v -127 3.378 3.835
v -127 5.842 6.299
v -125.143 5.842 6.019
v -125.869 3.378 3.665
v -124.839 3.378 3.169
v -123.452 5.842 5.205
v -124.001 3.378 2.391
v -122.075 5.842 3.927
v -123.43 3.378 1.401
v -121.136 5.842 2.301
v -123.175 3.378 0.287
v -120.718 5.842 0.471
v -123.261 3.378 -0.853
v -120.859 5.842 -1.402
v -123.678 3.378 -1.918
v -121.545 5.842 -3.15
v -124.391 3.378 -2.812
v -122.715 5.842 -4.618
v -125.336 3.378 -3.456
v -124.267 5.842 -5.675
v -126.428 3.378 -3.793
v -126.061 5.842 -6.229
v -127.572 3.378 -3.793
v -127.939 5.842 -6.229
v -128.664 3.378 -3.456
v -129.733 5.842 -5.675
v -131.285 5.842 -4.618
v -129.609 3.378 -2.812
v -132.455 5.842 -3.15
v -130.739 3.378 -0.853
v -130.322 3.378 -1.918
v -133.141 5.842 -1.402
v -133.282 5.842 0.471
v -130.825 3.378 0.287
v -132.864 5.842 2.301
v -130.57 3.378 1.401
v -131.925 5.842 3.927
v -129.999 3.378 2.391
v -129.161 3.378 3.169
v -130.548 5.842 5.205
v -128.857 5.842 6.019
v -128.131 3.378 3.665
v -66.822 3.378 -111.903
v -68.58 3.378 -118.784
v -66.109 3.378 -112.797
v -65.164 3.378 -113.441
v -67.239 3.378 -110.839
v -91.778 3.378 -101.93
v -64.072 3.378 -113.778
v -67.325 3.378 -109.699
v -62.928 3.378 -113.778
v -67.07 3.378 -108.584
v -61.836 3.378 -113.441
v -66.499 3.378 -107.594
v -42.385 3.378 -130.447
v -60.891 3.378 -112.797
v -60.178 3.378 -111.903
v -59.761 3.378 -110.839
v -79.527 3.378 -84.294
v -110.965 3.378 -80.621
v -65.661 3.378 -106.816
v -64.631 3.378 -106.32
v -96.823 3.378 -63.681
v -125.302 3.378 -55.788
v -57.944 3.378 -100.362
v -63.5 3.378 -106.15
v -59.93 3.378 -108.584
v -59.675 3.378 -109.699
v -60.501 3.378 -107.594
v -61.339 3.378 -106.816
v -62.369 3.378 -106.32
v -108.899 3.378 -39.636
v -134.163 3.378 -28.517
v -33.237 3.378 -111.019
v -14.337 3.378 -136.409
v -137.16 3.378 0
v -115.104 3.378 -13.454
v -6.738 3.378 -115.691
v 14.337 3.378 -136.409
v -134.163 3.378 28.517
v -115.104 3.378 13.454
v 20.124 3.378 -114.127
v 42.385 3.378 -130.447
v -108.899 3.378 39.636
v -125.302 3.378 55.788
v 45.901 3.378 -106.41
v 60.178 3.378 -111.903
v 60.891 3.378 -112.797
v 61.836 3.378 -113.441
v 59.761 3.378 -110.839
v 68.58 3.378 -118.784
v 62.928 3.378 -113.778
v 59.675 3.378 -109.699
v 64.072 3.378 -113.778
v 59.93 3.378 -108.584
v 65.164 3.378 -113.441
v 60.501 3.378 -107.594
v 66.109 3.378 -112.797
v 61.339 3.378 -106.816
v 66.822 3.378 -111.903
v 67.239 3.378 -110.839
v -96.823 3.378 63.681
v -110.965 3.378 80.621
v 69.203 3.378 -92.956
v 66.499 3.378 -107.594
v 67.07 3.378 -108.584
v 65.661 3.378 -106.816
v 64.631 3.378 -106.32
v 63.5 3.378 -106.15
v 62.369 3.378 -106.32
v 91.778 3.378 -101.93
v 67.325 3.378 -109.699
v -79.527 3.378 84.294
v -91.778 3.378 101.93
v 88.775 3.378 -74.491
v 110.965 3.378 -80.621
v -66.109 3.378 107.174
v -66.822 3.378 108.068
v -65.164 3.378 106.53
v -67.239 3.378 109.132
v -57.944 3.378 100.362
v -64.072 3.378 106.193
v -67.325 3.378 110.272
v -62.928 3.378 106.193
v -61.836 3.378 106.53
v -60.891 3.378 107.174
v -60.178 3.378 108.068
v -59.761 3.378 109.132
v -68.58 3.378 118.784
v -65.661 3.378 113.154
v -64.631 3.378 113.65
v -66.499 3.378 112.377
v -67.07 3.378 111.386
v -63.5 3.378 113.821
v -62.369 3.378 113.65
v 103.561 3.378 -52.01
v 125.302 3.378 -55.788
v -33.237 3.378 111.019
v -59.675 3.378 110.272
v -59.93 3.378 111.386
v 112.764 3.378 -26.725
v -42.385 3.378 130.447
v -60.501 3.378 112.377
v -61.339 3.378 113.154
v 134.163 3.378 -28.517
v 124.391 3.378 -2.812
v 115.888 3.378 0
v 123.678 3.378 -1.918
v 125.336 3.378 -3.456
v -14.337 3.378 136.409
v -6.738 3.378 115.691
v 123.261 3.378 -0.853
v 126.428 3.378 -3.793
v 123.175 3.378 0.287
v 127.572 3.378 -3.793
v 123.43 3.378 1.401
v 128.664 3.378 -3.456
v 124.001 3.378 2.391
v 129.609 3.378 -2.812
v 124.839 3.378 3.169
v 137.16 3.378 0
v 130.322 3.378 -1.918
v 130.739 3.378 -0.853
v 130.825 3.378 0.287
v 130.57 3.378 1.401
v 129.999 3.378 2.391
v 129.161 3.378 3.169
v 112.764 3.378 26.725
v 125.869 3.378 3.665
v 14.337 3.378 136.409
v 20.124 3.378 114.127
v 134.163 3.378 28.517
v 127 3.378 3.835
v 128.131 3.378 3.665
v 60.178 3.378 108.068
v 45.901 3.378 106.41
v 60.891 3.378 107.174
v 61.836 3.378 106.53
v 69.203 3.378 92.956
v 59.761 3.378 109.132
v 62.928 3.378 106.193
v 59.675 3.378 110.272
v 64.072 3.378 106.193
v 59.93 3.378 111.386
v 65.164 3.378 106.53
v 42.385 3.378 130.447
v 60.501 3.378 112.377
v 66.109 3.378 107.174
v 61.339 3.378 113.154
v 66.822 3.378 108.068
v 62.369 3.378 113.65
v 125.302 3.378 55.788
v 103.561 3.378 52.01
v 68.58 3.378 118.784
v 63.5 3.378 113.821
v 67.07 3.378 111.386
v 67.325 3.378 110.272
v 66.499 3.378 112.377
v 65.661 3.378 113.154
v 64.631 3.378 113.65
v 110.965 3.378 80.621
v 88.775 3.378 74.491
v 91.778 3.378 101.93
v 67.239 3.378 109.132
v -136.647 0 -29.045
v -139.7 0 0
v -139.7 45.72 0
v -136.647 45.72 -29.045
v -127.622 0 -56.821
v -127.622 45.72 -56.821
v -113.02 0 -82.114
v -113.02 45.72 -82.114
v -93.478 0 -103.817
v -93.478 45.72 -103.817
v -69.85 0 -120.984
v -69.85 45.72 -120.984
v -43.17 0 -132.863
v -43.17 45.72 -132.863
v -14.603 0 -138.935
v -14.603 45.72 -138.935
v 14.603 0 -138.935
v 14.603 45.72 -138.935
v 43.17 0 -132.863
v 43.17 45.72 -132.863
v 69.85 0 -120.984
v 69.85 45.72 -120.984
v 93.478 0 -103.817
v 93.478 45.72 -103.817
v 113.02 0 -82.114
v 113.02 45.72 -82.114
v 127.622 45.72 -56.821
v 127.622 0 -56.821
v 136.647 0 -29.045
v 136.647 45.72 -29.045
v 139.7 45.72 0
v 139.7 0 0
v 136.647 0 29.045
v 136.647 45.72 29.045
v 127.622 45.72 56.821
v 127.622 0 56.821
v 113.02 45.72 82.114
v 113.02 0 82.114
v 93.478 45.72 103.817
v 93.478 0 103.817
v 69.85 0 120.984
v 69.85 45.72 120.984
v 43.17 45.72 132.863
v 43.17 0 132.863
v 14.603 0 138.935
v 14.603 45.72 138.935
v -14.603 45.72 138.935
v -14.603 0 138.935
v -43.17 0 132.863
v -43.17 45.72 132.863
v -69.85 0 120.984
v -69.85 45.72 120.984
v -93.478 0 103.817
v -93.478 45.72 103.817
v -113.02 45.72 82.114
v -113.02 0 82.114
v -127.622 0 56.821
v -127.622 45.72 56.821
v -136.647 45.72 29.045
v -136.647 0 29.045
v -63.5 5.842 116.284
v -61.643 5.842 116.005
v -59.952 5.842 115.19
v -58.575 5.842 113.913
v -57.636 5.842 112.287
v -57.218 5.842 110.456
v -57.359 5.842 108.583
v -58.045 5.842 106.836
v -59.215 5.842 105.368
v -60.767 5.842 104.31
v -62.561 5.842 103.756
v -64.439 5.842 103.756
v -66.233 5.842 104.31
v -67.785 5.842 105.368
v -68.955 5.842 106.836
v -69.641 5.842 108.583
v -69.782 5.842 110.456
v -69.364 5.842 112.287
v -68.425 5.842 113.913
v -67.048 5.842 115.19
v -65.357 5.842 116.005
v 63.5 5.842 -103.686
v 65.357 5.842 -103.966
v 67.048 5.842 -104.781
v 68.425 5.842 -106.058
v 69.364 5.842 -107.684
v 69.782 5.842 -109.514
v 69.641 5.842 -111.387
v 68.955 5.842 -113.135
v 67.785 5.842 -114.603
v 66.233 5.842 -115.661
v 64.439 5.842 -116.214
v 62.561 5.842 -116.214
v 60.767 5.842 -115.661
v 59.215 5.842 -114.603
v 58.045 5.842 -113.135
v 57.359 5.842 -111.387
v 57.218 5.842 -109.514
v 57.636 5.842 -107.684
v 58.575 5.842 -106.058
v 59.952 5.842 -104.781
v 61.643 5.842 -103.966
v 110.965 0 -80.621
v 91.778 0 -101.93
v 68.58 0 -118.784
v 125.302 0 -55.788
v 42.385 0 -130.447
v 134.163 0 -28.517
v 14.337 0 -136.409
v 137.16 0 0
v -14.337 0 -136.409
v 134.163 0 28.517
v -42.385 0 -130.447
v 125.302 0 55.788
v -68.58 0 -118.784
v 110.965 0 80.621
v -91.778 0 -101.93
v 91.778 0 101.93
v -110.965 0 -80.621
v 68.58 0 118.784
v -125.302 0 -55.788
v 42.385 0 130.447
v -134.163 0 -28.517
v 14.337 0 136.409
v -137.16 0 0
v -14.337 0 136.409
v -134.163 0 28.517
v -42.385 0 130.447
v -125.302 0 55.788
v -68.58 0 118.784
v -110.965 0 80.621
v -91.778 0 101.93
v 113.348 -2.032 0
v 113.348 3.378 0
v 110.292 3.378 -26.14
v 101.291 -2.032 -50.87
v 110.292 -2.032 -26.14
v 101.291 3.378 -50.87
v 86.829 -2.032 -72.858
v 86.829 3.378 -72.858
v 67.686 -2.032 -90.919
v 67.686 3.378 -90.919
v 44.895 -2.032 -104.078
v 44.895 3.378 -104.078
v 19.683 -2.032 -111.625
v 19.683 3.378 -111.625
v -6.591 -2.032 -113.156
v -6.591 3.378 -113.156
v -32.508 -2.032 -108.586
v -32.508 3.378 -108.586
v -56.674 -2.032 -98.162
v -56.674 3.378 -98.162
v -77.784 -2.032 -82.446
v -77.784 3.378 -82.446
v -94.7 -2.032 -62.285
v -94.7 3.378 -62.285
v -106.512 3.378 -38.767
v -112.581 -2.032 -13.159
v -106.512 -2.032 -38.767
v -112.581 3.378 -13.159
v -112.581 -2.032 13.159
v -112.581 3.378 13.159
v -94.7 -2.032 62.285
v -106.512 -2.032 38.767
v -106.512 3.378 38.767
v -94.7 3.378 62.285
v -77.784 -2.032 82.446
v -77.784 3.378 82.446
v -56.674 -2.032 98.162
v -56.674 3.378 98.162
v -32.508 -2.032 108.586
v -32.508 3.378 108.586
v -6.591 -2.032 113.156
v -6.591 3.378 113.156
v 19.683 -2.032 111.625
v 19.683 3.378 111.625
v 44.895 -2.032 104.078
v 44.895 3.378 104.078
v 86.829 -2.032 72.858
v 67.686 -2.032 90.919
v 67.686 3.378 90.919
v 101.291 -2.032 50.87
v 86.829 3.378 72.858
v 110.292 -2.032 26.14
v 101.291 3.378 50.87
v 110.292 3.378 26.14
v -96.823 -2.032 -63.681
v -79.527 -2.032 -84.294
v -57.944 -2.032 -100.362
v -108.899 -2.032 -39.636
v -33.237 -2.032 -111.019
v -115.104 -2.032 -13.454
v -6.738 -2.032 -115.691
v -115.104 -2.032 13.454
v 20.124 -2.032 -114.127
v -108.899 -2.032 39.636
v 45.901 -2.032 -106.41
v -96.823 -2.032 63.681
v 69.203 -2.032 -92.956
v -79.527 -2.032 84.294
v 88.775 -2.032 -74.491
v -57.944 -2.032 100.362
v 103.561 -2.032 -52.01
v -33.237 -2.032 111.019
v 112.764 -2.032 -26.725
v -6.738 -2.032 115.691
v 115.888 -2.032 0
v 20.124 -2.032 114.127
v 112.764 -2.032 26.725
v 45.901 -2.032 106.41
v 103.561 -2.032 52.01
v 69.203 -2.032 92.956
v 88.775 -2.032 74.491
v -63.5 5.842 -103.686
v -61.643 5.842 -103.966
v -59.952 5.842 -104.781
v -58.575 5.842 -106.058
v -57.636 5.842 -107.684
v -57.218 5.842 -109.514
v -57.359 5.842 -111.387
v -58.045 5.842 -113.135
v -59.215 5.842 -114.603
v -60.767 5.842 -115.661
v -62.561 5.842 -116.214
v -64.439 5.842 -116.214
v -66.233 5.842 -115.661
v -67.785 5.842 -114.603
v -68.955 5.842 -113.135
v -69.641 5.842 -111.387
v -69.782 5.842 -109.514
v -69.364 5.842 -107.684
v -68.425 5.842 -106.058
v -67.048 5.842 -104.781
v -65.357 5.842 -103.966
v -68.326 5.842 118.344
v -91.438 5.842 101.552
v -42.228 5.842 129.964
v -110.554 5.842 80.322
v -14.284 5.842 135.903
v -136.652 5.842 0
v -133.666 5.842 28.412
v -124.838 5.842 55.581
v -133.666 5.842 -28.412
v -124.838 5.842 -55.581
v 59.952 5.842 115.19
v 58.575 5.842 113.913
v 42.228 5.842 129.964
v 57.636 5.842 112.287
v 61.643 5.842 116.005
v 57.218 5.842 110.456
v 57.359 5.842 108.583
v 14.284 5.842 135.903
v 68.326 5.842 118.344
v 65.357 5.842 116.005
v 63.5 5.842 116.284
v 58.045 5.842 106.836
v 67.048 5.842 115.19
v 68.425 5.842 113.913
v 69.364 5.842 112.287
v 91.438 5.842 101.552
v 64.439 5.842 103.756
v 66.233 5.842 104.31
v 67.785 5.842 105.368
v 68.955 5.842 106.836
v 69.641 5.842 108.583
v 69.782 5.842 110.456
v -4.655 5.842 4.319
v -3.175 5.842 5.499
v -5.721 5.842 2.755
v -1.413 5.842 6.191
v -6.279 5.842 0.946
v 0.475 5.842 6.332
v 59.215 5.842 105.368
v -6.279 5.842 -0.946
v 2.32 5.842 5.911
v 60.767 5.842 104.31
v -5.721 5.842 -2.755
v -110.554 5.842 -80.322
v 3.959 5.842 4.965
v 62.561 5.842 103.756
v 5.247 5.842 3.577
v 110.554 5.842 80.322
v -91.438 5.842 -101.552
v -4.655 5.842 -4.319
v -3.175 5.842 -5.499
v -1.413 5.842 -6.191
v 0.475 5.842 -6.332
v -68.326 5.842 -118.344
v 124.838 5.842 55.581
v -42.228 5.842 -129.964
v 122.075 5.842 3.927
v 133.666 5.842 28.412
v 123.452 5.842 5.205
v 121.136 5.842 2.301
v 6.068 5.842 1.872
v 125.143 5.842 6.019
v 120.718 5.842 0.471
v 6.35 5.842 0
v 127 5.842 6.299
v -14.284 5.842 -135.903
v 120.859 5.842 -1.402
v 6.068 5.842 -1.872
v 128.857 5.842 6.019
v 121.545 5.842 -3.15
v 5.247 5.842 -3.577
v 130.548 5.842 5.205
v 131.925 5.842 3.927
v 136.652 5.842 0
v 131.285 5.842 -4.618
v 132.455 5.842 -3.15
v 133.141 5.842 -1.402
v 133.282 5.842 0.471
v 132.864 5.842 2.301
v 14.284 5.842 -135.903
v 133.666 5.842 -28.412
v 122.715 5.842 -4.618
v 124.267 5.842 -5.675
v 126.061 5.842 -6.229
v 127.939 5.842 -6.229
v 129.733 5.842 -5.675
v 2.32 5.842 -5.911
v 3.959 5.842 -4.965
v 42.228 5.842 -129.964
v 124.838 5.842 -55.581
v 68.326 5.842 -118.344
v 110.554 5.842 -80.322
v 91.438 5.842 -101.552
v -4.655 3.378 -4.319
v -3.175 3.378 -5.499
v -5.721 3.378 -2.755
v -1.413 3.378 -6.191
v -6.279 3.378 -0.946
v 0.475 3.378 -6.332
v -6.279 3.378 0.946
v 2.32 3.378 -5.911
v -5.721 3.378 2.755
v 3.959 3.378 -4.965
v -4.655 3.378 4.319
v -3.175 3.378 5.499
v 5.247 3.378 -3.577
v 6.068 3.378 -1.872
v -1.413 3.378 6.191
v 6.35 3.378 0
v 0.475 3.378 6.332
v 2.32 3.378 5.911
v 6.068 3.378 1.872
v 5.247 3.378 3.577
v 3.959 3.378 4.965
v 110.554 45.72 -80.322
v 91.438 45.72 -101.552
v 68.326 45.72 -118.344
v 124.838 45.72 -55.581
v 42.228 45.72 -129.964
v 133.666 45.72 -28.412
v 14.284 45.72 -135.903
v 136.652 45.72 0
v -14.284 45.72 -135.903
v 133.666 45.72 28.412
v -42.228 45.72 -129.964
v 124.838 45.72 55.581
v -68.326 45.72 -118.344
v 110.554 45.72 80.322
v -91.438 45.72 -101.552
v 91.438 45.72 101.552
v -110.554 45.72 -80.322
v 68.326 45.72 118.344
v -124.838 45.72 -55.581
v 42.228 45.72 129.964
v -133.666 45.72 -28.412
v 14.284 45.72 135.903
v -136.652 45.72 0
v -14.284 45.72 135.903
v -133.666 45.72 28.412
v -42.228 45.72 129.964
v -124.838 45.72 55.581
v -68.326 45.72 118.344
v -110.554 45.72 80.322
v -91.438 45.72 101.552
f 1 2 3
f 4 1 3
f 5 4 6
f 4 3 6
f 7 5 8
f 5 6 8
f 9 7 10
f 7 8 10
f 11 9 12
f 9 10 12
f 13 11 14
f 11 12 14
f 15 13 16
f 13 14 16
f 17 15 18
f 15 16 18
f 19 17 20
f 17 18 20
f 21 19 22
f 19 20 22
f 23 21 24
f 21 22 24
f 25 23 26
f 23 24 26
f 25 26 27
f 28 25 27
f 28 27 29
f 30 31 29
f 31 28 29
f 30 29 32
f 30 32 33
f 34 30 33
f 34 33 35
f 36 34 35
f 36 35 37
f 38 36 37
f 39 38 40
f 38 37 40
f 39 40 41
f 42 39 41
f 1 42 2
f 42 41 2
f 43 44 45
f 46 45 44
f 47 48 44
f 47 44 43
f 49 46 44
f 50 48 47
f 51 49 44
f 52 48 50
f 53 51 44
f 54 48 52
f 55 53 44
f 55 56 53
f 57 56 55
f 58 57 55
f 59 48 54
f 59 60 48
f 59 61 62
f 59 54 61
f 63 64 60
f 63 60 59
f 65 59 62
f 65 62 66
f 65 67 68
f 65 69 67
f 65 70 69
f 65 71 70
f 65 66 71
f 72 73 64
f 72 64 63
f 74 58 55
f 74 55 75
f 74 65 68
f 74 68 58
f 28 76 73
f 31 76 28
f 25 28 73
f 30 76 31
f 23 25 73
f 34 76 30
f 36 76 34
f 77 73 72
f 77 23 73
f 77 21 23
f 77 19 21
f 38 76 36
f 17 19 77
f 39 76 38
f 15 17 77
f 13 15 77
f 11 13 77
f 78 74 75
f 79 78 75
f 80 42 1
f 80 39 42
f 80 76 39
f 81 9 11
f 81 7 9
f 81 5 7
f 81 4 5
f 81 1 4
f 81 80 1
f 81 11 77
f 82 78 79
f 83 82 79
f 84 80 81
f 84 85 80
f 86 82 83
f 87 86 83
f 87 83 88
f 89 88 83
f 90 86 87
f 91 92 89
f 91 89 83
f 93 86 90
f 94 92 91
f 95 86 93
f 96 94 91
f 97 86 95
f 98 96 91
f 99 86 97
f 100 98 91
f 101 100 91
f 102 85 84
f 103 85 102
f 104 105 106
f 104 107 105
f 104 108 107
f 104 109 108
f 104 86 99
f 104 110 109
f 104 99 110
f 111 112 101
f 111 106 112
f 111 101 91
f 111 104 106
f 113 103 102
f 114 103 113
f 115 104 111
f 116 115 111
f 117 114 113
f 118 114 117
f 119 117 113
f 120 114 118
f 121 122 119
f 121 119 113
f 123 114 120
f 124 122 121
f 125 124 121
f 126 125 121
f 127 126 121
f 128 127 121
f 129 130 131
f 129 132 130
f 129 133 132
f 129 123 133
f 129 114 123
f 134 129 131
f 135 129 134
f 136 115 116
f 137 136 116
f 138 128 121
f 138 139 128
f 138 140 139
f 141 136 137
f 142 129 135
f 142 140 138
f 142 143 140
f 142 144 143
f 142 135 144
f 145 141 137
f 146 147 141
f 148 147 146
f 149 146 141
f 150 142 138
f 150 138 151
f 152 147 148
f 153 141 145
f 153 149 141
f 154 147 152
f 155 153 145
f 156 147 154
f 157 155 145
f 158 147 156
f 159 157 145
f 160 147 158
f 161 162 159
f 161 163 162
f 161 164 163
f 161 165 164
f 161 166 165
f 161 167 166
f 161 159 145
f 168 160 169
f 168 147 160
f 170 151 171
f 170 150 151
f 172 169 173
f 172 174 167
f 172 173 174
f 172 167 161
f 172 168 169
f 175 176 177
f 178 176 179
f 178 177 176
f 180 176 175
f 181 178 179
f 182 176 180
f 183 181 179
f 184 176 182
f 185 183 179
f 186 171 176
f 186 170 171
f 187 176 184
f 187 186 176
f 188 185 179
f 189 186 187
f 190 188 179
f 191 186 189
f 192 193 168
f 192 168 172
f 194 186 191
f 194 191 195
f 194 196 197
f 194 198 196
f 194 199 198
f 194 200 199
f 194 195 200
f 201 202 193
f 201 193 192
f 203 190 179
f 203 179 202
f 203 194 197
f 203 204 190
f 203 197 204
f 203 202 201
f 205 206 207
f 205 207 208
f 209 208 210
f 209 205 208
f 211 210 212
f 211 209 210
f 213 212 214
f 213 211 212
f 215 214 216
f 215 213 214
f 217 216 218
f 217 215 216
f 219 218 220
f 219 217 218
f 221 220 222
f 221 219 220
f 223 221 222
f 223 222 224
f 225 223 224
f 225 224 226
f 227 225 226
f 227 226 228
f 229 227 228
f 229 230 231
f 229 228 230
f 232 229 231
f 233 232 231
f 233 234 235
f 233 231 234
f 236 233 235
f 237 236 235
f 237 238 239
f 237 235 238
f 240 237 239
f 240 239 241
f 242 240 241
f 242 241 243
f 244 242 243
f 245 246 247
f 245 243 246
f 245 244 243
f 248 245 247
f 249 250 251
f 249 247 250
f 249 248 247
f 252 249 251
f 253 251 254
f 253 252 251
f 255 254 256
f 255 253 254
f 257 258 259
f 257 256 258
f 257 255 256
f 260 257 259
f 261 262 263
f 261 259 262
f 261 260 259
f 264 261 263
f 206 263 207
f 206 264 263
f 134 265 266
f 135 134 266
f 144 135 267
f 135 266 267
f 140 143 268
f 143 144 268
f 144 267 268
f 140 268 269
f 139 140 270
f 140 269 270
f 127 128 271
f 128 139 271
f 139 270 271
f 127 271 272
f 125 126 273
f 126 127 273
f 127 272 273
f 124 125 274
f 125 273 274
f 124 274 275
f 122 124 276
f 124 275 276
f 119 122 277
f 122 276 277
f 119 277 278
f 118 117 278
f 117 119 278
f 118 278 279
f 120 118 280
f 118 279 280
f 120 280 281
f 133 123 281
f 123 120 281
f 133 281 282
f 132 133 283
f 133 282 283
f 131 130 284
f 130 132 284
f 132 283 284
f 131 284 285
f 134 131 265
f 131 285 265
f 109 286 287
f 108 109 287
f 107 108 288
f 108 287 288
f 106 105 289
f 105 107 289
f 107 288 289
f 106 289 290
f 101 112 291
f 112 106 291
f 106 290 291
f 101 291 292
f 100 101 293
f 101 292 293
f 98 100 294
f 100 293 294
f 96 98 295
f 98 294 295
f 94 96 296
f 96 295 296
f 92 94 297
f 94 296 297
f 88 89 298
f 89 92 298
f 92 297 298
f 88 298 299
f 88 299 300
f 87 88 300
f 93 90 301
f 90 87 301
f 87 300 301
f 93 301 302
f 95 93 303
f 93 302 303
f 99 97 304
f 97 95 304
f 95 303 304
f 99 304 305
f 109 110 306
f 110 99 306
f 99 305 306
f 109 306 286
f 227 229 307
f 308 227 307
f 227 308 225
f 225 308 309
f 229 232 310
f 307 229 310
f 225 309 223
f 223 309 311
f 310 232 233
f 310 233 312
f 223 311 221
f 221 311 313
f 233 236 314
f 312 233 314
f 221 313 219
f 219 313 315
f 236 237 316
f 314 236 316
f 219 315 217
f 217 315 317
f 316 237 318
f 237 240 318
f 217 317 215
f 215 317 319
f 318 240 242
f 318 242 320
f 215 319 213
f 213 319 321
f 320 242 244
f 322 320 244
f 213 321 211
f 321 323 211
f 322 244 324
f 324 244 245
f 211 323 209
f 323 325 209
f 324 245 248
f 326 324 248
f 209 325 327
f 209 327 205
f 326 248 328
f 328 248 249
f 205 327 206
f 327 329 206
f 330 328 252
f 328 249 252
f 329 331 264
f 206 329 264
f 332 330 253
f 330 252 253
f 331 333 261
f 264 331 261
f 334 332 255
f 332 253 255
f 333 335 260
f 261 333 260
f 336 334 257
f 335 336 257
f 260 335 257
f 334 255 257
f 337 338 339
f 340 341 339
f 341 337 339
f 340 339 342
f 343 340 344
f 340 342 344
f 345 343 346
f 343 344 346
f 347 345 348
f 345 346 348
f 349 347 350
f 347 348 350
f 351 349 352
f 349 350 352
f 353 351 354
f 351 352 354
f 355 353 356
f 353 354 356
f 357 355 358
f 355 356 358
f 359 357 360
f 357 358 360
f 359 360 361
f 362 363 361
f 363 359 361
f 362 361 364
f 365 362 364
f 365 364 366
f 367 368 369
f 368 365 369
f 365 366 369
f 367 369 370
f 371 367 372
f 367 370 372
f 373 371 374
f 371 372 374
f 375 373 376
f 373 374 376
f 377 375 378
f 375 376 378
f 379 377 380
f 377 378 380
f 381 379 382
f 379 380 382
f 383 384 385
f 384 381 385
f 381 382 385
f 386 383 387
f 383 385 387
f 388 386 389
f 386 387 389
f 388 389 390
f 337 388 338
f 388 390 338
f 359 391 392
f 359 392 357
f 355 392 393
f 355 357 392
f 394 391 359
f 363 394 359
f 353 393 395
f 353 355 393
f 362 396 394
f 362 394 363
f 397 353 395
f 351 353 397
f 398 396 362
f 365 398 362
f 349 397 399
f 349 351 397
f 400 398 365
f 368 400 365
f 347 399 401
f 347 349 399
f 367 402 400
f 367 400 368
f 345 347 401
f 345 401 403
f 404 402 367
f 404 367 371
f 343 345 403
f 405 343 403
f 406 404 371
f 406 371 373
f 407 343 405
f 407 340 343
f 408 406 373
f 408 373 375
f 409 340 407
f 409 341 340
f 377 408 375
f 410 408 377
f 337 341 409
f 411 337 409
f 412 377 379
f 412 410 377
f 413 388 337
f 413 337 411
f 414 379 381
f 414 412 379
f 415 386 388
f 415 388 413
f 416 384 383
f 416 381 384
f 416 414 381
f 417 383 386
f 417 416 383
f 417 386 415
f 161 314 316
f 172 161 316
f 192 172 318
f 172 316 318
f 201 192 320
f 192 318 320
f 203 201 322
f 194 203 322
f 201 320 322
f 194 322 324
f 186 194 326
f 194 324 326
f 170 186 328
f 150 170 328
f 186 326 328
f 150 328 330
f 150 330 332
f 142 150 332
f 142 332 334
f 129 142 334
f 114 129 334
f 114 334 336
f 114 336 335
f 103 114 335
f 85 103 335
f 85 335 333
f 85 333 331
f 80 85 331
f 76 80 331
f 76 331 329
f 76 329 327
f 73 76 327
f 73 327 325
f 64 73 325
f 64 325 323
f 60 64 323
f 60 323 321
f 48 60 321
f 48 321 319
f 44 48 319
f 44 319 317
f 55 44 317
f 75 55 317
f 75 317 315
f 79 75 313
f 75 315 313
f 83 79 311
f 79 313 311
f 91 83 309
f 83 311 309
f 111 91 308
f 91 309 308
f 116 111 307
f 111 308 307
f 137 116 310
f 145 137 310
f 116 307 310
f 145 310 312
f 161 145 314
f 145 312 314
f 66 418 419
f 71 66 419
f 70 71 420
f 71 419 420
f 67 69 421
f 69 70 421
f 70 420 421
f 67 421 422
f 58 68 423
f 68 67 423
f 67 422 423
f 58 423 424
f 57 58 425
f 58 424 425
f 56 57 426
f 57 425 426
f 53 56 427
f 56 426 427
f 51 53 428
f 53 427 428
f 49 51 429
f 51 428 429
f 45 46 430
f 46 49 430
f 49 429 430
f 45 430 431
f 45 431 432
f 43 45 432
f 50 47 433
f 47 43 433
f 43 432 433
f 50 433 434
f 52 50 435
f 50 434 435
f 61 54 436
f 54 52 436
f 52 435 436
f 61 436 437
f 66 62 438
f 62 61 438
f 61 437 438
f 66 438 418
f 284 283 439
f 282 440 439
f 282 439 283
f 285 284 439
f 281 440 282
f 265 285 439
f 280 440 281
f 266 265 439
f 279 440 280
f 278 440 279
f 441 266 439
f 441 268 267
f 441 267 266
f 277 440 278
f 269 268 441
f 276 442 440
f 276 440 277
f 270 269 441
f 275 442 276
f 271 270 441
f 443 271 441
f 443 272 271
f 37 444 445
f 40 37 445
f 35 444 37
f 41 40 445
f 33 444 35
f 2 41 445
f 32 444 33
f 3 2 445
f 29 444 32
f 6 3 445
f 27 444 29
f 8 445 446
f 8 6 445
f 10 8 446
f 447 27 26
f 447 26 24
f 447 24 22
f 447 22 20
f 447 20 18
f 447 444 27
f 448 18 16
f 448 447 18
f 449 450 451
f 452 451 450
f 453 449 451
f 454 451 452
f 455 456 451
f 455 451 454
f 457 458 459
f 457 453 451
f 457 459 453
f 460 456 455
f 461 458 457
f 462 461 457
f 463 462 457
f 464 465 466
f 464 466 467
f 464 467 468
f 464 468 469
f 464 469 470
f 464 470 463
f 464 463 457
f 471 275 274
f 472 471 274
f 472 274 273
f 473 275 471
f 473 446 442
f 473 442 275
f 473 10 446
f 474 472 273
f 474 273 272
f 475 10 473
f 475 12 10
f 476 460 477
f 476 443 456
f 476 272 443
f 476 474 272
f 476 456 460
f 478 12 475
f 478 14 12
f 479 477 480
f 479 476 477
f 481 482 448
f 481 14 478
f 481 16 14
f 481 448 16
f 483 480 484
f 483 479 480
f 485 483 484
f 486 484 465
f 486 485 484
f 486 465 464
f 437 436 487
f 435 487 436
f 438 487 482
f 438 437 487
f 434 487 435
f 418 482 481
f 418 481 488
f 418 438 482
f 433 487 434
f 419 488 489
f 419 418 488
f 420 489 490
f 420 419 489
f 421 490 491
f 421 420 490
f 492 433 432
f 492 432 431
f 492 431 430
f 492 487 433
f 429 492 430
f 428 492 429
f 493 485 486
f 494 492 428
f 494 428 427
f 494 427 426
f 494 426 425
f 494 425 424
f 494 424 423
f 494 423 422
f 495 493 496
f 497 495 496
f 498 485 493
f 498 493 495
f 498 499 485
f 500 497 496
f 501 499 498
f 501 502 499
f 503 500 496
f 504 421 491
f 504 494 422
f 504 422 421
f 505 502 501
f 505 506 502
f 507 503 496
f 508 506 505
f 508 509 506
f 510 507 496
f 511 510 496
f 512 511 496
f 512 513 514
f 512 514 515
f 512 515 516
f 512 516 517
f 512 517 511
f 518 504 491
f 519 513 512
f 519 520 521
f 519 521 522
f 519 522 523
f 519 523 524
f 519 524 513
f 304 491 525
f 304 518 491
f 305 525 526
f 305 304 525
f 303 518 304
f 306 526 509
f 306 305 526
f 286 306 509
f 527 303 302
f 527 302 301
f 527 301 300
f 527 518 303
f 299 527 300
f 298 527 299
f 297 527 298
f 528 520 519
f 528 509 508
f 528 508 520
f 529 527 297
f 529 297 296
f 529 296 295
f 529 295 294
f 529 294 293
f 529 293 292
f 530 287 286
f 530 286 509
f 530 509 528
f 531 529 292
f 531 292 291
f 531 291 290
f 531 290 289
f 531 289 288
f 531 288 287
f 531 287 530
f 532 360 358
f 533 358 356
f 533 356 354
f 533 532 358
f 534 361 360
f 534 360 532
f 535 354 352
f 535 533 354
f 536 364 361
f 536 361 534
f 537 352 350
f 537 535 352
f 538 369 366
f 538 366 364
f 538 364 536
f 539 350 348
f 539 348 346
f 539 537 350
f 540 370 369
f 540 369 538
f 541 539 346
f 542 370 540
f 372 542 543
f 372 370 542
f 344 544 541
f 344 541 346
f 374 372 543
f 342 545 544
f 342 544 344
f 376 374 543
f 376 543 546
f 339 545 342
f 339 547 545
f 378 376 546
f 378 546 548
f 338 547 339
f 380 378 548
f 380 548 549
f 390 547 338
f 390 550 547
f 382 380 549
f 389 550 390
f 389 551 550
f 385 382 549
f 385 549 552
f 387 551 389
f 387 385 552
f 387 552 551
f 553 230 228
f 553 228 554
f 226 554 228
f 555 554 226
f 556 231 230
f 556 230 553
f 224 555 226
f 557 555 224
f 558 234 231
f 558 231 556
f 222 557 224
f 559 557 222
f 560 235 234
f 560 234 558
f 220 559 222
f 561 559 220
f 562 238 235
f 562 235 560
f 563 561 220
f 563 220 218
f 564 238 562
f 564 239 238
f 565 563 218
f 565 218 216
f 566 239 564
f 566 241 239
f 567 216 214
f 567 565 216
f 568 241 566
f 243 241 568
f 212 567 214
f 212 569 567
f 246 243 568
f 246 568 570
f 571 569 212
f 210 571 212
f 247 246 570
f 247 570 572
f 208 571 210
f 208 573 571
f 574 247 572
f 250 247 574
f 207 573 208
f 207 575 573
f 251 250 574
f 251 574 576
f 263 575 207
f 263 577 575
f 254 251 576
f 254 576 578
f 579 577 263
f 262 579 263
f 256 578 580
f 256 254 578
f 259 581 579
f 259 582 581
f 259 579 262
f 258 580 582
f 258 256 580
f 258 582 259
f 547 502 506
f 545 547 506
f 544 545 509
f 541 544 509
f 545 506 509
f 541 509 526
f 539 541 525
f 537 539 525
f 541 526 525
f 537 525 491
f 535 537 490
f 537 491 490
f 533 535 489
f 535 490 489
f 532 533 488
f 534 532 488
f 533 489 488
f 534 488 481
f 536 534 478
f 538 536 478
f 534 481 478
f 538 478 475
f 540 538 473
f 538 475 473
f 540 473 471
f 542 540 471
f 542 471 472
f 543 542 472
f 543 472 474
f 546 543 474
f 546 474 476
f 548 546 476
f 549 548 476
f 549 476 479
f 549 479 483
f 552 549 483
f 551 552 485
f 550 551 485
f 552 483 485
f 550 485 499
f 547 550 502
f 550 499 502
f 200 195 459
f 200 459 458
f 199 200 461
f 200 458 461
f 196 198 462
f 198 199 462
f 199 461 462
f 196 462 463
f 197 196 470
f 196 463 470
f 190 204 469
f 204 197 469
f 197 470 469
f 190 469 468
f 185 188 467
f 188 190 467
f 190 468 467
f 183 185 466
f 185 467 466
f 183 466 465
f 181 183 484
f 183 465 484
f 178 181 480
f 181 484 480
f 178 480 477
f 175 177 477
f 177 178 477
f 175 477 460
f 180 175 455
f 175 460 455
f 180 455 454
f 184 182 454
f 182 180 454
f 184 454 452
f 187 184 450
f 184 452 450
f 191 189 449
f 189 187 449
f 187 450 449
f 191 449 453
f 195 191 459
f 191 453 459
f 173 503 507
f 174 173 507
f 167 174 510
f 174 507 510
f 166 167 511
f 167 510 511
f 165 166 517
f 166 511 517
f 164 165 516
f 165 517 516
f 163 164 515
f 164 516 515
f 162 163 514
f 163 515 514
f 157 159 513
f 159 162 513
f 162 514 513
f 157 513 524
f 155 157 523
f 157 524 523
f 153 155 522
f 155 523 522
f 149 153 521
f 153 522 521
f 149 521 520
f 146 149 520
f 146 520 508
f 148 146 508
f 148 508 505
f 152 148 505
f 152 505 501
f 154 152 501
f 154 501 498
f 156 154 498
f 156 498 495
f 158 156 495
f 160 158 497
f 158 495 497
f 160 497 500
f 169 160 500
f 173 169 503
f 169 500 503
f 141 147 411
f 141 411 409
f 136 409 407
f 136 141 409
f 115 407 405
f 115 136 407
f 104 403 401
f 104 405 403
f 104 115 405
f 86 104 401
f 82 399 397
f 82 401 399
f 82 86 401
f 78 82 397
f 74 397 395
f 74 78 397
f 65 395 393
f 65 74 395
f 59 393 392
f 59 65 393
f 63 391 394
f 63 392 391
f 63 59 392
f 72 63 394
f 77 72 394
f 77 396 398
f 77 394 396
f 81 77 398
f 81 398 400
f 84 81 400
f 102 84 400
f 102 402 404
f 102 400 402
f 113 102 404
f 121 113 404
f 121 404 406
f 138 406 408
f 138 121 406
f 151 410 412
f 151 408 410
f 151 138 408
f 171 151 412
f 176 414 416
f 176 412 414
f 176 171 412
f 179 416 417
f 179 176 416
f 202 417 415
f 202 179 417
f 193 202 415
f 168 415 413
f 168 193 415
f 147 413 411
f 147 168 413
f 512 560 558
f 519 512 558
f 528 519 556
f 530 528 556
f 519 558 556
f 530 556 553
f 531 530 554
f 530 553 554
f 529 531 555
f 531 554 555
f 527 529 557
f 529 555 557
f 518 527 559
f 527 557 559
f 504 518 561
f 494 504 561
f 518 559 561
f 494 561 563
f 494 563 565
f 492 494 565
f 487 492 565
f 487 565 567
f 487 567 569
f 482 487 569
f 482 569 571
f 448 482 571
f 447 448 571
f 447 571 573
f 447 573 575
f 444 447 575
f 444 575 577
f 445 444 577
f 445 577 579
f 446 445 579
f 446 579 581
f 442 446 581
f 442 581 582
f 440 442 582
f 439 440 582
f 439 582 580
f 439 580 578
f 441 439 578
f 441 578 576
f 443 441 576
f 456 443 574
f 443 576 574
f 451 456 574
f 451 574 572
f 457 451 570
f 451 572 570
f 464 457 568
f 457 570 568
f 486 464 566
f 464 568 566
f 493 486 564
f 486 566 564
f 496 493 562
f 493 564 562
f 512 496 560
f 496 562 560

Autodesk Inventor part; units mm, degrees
ref_plane "YZ Plane" through (0, 0, 0) normal (1, 0, 0) x (0, 1, 0)
ref_plane "XZ Plane" through (0, 0, 0) normal (0, 1, 0) x (-1, 0, 0)
ref_plane "XY Plane" through (0, 0, 0) normal (0, 0, 1) x (1, 0, 0)
sketch "Sketch1" plane through (0, 0, 0) normal (0, 1, 0) x (-1, 0, 0)
  circle A0 centre (0, 0) radius 139.7
  dimension "d0" = 279.4
extrude "Extrusion1" add sketch "Sketch1" along normal blind 45.72
sketch "Sketch3" plane through (0, 45.72, 0) normal (0, 1, 0) x (1, 0, 0)
  circle A0 centre (0, 0) radius 136.652
  dimension "d7" = 273.304
extrude "Extrusion3" cut sketch "Sketch3" against normal blind 39.878
sketch "Sketch4" plane through (0, 0, 0) normal (0, -1, 0) x (1, 0, 0)
  circle A0 centre (0, 0) radius 137.16
  dimension "d10" = 274.32
extrude "Extrusion5" cut sketch "Sketch4" against normal blind 3.3782
sketch "Sketch5" plane through (0, 3.3782, 0) normal (0, -1, 0) x (1, 0, 0)
  circle A0 centre (0, 0) radius 115.8875
  circle A1 centre (0, 0) radius 113.3475
  dimension "d15" = 231.775
  dimension "d16" = 226.695
extrude "Extrusion6" add sketch "Sketch5" along normal blind 5.4102
sketch "Sketch6" plane through (0, 5.842, 0) normal (0, 1, 0) x (1, 0, 0)
  circle A0 centre (0, 0) radius 6.35
  dimension "d19" = 12.7
extrude "Extrusion7" cut sketch "Sketch6" against normal through all
sketch "Sketch7" plane through (0, 5.842, 0) normal (0, -1, 0) x (1, 0, 0)
  point P0 (0, 0)
  point P1 (127, 0)
  point P2 (63.5, 109.9852)
  point P3 (-63.5, 109.9852)
  point P4 (-127, 0)
  point P5 (-63.5, -109.9852)
  point P6 (63.5, -109.9852)
  dimension "d22" = 127
  dimension "d25" = 360
hole "Hole1" at (127, 5.842, 0) at (63.5, 5.842, 109.9852) at (-63.5, 5.842, 109.9852) at (-127, 5.842, 0) at (-63.5, 5.842, -109.9852) at (63.5, 5.842, -109.9852) direction (0, -1, 0) diameter 6.604 end through all countersink diameter 12.5984 countersink angle 90 clearance for "Flat Head Machine Screw" size "M6" standard "Ansi Metric M Profile"
sketch "Sketch8" plane through (0, 3.3782, 0) normal (0, -1, 0) x (1, 0, 0)
  point P0 (0, 0)
properties part number "bowl"
